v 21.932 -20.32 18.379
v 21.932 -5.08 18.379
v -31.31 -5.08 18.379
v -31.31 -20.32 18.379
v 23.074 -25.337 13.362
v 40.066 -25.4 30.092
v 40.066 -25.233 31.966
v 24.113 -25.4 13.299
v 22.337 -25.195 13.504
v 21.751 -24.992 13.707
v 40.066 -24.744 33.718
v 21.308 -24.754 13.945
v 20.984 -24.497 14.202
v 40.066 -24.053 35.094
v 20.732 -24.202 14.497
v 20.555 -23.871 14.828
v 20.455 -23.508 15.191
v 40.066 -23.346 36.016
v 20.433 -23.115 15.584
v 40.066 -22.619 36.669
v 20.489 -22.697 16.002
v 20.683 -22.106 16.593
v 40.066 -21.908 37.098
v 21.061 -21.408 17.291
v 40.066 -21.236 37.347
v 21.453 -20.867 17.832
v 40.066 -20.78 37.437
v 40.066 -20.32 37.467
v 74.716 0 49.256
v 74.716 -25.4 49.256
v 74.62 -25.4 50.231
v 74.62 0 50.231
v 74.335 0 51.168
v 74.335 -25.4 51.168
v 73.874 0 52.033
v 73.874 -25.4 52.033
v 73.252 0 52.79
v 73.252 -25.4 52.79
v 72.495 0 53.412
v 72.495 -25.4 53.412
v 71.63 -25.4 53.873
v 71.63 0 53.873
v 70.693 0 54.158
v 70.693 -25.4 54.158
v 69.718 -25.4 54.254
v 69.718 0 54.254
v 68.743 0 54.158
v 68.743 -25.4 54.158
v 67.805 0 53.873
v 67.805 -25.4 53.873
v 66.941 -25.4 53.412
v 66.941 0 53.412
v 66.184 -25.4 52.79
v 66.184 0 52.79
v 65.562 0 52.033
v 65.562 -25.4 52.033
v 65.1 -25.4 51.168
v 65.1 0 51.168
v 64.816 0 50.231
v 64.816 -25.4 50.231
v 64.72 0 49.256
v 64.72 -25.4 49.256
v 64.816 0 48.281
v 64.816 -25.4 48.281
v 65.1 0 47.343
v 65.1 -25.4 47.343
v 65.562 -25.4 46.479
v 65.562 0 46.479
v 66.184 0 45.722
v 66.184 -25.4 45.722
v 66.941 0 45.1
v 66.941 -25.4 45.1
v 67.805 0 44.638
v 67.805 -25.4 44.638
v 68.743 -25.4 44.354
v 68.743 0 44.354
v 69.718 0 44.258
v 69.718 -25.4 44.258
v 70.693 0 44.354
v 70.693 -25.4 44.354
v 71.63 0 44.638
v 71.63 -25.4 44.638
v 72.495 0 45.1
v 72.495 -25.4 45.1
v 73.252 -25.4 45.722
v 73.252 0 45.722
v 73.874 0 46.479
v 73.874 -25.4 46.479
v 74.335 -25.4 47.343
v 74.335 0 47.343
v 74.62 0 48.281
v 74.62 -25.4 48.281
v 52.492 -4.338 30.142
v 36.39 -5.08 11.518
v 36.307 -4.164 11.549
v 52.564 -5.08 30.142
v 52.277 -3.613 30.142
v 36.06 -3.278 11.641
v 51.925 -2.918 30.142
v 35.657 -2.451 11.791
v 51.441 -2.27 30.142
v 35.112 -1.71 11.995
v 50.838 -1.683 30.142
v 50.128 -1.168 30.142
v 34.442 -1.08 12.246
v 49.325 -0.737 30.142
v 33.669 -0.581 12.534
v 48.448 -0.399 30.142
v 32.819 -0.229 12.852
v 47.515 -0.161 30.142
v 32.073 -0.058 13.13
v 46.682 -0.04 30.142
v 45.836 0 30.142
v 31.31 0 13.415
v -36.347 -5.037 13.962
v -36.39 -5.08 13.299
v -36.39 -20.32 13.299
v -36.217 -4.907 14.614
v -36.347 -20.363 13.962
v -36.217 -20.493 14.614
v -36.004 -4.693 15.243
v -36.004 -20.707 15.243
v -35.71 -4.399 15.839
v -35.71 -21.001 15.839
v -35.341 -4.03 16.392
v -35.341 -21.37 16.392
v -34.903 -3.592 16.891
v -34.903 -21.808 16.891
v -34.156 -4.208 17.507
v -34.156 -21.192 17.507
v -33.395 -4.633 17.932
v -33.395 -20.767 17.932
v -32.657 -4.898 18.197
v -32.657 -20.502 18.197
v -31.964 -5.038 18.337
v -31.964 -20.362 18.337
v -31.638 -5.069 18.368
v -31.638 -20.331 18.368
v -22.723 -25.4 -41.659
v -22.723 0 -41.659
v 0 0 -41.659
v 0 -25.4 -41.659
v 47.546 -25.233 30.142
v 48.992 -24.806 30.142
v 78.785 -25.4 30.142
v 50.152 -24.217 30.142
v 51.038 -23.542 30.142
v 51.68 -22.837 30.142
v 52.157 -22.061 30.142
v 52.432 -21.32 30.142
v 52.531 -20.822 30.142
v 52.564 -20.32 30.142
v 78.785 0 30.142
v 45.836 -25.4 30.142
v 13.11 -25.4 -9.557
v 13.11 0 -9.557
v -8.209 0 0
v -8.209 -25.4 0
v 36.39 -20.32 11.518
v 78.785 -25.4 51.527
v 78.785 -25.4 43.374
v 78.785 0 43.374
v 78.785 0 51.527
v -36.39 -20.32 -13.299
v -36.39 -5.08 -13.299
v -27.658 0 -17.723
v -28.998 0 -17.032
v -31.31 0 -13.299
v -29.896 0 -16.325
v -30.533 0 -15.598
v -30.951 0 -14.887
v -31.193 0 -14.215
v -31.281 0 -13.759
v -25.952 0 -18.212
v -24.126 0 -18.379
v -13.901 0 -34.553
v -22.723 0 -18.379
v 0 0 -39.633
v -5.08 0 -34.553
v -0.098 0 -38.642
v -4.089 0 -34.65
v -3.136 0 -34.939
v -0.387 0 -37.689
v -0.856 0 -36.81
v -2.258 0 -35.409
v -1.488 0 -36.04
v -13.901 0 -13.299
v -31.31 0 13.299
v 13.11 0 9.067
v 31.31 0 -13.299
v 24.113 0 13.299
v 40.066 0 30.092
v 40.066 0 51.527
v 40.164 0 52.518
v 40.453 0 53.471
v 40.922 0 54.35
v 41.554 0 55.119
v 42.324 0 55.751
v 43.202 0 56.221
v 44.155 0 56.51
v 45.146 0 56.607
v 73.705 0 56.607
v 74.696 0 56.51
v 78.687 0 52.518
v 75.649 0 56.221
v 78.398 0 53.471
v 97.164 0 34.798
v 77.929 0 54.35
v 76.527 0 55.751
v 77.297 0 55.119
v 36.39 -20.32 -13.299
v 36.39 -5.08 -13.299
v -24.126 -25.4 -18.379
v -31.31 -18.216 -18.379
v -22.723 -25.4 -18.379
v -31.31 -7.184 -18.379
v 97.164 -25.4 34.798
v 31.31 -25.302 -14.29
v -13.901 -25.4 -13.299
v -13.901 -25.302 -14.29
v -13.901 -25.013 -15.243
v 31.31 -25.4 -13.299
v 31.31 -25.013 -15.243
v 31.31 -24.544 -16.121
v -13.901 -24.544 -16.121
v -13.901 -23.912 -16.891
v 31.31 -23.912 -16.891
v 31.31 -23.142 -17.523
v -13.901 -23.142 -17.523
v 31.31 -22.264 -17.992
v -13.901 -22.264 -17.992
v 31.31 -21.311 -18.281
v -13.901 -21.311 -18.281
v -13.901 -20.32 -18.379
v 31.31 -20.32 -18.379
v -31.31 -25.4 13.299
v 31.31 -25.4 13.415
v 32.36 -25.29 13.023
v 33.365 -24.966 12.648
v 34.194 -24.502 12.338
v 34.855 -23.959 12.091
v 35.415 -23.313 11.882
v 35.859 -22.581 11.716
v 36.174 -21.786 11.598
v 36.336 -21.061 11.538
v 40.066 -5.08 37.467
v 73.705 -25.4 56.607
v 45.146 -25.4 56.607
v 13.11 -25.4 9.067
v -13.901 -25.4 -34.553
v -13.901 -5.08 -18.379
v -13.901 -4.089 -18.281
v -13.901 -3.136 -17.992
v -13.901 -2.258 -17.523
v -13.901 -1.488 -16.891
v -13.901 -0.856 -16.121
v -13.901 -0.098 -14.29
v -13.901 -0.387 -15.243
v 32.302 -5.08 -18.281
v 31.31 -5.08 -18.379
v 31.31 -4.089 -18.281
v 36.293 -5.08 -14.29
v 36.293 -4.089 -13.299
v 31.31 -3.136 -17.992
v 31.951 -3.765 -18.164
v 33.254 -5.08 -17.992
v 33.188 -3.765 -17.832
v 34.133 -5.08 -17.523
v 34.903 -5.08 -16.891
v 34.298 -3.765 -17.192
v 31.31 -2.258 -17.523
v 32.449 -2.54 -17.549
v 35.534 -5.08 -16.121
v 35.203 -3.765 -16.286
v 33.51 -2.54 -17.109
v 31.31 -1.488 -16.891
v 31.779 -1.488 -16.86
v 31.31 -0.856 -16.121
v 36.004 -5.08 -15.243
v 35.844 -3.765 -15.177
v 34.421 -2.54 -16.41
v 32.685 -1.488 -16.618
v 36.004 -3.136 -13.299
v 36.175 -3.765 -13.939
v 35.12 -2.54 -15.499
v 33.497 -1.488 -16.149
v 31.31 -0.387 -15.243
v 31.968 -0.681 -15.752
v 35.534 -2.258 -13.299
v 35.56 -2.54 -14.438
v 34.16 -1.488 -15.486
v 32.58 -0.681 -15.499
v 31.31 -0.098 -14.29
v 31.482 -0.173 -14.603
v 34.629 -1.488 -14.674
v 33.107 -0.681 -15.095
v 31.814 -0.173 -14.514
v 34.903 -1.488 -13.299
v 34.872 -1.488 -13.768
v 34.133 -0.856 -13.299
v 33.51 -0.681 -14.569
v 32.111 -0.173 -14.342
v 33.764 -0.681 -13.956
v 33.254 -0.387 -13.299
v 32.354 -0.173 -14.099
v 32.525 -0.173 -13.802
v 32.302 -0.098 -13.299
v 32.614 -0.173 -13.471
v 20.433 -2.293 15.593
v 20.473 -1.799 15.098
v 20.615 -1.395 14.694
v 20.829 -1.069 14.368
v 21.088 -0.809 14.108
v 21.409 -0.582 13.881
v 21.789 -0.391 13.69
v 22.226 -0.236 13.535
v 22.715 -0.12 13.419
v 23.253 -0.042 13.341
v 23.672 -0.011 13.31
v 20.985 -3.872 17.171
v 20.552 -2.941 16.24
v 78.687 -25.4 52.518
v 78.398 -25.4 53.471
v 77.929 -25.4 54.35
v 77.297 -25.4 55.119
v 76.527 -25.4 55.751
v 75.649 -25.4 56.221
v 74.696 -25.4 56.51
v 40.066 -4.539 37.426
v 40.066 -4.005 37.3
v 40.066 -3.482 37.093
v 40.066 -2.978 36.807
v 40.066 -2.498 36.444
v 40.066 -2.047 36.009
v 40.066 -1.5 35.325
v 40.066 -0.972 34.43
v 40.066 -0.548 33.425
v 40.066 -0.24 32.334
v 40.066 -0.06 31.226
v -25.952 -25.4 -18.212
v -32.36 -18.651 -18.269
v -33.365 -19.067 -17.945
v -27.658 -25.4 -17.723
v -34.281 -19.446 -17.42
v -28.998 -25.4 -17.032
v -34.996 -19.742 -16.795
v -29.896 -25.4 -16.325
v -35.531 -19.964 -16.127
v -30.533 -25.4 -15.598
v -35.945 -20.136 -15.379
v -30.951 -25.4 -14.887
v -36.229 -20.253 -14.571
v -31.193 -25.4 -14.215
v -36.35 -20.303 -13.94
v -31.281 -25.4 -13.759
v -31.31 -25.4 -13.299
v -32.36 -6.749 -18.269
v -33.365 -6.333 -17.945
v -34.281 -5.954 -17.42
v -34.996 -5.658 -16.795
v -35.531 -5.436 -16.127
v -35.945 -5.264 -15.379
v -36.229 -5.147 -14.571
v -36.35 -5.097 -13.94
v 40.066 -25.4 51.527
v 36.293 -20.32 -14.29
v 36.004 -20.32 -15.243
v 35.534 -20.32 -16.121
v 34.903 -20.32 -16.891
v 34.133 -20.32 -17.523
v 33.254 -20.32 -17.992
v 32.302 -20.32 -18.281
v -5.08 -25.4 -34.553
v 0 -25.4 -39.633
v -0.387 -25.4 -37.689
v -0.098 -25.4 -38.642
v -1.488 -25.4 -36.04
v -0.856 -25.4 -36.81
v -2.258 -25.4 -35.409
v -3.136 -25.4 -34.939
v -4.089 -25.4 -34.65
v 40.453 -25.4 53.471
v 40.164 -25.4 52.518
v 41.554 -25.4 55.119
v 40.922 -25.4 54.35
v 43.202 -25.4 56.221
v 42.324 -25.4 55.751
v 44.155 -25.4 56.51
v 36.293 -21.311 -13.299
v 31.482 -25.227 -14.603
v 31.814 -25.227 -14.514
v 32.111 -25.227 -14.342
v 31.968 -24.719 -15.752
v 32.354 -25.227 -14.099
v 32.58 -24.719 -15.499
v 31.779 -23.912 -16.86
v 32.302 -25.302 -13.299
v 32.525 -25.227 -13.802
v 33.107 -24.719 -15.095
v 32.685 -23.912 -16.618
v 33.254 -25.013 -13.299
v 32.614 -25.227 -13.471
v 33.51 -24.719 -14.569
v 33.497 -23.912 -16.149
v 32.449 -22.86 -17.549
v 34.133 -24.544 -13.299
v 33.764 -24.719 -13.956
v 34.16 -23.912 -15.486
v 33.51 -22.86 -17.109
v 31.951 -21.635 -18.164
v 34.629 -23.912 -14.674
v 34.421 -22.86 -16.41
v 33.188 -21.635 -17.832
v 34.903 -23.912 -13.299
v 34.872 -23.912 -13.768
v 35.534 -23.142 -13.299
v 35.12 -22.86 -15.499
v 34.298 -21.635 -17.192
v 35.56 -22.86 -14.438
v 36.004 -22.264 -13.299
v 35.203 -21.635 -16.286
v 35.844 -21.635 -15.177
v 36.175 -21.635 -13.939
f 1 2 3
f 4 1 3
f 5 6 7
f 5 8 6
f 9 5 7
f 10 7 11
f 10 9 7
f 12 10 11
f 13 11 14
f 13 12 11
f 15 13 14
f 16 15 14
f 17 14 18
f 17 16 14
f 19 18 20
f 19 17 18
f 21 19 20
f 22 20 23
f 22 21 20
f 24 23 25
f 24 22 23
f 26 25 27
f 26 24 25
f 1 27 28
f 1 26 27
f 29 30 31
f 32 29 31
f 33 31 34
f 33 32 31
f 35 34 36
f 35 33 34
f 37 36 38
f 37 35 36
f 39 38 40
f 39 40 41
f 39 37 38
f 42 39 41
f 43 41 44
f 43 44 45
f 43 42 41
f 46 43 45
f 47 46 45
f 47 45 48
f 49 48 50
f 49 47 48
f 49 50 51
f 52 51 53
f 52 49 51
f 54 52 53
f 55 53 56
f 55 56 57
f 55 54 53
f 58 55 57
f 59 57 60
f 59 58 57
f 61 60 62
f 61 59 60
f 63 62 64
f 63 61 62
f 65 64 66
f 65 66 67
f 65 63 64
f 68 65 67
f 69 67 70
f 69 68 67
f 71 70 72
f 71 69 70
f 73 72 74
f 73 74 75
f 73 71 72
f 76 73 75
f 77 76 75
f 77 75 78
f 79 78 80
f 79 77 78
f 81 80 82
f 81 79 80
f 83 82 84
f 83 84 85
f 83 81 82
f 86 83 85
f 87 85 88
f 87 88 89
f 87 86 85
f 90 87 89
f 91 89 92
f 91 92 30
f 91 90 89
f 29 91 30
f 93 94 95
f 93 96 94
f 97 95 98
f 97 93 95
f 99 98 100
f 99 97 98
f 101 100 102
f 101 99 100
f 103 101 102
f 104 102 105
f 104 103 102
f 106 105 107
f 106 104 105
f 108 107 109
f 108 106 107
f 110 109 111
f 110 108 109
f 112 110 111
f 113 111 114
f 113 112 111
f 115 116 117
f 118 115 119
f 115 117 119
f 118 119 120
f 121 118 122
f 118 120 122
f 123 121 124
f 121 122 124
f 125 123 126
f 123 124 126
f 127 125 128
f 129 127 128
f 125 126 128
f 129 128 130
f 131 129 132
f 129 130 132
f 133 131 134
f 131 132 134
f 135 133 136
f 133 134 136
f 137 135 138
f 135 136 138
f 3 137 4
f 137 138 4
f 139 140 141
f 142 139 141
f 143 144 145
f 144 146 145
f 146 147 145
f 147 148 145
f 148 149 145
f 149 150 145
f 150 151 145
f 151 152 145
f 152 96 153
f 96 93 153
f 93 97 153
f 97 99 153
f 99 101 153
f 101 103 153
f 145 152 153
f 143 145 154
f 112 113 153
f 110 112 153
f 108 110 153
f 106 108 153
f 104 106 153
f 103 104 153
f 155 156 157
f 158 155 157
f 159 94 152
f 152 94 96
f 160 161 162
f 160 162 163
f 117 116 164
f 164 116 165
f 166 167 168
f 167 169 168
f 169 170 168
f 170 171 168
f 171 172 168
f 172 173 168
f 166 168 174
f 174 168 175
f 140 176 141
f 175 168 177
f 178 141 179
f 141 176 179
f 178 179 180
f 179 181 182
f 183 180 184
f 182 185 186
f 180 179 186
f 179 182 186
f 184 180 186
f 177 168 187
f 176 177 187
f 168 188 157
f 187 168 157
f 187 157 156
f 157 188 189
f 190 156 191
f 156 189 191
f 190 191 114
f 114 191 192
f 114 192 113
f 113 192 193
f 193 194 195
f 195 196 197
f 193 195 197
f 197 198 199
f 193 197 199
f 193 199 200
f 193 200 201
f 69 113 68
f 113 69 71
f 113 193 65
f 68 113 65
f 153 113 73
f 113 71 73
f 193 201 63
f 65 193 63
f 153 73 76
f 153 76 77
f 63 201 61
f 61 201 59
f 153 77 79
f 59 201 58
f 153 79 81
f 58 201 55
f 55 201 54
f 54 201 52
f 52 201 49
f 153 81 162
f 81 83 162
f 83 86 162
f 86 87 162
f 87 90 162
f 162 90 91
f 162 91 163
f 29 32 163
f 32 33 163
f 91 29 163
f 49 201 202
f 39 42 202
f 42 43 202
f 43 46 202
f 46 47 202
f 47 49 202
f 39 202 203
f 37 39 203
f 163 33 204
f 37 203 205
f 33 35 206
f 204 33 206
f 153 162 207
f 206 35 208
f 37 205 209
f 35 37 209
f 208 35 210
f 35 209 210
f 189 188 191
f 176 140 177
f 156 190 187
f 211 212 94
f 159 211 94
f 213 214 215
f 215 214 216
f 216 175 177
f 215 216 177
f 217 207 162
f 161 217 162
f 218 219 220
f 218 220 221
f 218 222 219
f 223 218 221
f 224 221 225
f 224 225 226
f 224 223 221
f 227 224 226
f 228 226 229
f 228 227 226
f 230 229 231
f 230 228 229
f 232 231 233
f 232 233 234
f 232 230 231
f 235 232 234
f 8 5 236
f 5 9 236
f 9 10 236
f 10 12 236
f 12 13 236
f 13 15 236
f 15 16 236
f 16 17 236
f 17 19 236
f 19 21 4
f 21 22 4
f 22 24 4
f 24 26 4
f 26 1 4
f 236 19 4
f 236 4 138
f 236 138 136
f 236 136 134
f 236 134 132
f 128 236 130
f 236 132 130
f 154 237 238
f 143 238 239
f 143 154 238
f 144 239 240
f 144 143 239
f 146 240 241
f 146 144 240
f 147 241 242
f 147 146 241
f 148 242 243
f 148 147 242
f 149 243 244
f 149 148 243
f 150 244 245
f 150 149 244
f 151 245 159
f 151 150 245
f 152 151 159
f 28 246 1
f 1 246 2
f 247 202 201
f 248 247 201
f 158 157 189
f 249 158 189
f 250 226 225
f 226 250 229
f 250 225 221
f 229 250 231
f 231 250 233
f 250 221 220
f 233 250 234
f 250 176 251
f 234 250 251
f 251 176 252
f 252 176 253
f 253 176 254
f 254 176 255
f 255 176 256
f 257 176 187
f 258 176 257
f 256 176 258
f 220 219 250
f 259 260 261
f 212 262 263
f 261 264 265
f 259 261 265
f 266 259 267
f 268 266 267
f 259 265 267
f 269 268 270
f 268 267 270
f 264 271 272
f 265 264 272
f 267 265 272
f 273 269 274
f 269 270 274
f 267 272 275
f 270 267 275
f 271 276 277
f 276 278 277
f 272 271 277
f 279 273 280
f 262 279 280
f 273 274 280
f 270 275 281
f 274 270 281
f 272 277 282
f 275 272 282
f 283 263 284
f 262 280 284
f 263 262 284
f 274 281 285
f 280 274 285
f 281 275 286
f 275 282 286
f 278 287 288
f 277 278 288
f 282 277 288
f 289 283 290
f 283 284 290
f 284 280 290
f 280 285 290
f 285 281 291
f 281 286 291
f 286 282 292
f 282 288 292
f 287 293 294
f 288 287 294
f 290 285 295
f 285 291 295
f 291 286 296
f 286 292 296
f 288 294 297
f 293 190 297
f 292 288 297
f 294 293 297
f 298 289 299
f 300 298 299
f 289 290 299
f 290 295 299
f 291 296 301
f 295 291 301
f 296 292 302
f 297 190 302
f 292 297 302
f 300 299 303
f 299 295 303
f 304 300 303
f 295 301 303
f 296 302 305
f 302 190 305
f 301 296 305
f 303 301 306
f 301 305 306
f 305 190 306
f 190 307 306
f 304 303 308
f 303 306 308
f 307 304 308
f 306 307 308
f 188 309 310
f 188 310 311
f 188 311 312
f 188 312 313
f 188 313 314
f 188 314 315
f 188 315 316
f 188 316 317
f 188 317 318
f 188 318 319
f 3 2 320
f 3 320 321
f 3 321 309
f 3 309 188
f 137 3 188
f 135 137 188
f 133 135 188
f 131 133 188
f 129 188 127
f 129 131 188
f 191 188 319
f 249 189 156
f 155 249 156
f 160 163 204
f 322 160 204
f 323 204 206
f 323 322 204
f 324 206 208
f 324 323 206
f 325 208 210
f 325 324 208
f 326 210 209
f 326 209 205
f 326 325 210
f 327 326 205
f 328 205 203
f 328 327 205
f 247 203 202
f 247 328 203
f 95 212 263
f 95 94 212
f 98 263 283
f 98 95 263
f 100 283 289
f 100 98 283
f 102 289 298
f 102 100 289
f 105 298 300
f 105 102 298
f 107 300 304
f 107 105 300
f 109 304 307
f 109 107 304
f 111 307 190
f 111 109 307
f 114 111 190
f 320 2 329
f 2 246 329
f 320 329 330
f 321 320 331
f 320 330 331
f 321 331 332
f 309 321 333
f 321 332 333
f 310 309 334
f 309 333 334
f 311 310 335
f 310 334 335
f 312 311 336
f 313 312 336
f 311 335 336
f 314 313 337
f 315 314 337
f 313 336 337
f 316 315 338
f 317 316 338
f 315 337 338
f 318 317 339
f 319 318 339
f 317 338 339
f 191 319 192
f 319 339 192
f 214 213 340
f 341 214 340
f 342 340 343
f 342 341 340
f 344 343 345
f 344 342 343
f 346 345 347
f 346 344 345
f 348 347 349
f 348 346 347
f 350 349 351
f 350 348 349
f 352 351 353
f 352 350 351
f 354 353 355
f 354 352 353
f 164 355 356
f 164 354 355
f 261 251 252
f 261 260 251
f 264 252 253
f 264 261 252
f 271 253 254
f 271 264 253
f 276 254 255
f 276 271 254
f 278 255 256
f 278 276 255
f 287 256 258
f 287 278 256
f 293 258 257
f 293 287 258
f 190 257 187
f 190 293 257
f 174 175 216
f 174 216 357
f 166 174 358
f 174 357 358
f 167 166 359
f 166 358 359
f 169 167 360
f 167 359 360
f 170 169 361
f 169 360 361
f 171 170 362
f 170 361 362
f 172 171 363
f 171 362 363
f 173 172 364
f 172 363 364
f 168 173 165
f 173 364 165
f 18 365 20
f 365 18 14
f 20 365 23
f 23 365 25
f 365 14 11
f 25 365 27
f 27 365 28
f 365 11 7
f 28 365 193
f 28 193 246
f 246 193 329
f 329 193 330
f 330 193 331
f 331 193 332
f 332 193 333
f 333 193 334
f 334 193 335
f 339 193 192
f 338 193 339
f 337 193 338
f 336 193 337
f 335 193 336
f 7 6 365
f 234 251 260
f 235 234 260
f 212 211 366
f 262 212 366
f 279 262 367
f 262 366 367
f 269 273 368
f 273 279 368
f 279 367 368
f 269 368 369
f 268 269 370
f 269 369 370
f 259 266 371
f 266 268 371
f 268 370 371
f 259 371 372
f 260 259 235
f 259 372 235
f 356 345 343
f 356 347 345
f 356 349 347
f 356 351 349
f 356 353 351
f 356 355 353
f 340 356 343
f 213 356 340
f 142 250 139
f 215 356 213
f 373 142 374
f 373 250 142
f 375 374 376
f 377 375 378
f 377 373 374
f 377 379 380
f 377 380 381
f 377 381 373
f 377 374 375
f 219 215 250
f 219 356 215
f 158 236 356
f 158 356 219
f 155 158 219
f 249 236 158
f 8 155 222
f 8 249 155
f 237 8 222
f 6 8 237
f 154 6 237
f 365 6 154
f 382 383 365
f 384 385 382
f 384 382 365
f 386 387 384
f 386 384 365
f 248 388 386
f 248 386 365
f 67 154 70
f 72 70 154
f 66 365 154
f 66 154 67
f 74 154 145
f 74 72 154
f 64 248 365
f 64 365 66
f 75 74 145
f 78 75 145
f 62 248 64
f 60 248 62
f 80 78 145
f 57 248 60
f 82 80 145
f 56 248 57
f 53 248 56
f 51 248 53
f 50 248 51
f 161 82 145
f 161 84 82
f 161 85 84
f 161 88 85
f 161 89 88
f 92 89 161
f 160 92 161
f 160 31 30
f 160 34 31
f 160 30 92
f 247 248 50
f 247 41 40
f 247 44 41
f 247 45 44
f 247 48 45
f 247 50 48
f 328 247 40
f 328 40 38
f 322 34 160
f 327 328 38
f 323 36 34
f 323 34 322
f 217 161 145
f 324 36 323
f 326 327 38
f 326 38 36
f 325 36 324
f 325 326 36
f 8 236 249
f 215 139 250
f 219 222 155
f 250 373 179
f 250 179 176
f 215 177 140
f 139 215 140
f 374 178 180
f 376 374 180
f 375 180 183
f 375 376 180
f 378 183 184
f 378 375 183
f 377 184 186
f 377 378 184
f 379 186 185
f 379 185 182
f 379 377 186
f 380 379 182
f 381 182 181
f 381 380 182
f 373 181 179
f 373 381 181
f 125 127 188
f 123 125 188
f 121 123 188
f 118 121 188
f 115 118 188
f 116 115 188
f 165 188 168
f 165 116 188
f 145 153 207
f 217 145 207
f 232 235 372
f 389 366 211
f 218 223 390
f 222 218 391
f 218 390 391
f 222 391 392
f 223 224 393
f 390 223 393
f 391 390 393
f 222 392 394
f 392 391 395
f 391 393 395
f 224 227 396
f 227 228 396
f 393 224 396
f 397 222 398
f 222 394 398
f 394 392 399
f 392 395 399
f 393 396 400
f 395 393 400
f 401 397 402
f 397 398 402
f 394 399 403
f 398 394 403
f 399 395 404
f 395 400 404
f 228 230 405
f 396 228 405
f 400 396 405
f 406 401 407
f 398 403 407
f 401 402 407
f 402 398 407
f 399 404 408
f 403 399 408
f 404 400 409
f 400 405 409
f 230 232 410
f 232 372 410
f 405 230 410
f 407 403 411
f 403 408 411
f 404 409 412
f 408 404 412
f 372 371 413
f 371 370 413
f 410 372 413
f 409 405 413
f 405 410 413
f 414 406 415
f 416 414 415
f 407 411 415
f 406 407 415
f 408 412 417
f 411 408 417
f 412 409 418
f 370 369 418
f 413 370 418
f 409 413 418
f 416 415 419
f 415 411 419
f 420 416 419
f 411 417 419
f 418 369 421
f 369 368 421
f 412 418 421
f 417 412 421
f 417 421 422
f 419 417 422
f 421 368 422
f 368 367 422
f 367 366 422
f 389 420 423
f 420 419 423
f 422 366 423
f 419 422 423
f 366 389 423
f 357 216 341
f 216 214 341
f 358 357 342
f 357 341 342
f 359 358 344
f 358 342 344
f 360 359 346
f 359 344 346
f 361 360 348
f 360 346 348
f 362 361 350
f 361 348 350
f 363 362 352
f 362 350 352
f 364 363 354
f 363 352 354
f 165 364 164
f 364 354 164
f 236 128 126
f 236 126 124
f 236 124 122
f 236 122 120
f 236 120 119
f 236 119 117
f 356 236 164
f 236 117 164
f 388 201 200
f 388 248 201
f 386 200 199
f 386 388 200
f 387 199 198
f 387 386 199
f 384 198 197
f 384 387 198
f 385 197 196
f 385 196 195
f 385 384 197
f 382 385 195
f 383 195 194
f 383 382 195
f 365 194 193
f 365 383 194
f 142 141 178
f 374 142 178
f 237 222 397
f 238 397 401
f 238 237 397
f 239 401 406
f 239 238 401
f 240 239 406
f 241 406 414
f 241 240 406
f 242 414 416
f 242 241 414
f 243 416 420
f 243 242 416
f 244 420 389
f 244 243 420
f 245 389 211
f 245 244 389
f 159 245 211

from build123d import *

# Parameters (mm, degrees)
F0_R     = 4.998133971
F1_DEPTH = 25.4
F2_R     = 5.08
F3_SIZE  = 5.08
F4_SIZE  = 5.08
F5_R     = 5.08
F6_R     = 5.08
F7_R     = 5.08
F8_R     = 5.08
F9_R     = 5.08


with BuildPart() as f1:
    # F0 (on Front) → F1 (new body)
    with BuildSketch(Plane.XZ):
        Polygon((-13.9009580016, -18.3790195733), (36.3904610276, -18.3790195733), (36.3904610276, 11.5175191313), (36.3904610276, 18.3790195733), (21.9322983176, 18.3790195733), (-36.3904610276, 18.3790195733), (-36.3904610276, -18.3790195733), (-22.7228868753, -18.3790195733), (-22.7228868753, -41.6591130197), (0, -41.6591130197), (0, -34.5525592566), (-13.9009580016, -34.5525592566), align=None)
        Polygon((-8.2092965022, 0), (13.1103685126, 9.0669831261), (13.1103685126, -9.5570906997), align=None, mode=Mode.SUBTRACT)
        Polygon((36.3904610276, 18.3790195733), (36.3904610276, 11.5175191313), (52.5639988482, 30.1415920258), (78.7847340107, 30.1415920258), (78.7847340107, 43.3744862676), (78.7847340107, 56.6073805094), (40.0662571192, 56.6073805094), (40.0662571192, 37.4673998365), (21.9322983176, 18.3790195733), align=None)
        with Locations((69.7177499533, 49.2557734251)):
            Circle(F0_R, mode=Mode.SUBTRACT)
        Polygon((78.7847340107, 43.3744862676), (78.7847340107, 30.1415920258), (97.1637517214, 34.7976125777), align=None)
    extrude(amount=F1_DEPTH)

    # F2
    f2_edges = [f1.edges().sort_by_distance(p)[0] for p in [
        (0, -12.7, -34.552559),
    ]]
    fillet(f2_edges, radius=F2_R)

    # F3
    f3_edges = [f1.edges().sort_by_distance(p)[0] for p in [
        (-7.229081, -25.4, 18.37902),
        (-36.390461, -25.4, 0),
    ]]
    chamfer(f3_edges, length=F3_SIZE)

    # F4
    f4_edges = [f1.edges().sort_by_distance(p)[0] for p in [
        (-7.229081, 0, 18.37902),
        (-36.390461, 0, 0),
    ]]
    chamfer(f4_edges, length=F4_SIZE)

    # F5
    f5_edges = [f1.edges().sort_by_distance(p)[0] for p in [
        (-36.390461, -12.7, 18.37902),
    ]]
    fillet(f5_edges, radius=F5_R)

    # F6
    f6_edges = [f1.edges().sort_by_distance(p)[0] for p in [
        (78.784734, -12.7, 56.607381),
        (40.066257, -12.7, 56.607381),
    ]]
    fillet(f6_edges, radius=F6_R)

    # F7
    f7_edges = [f1.edges().sort_by_distance(p)[0] for p in [
        (36.390461, -12.7, -18.37902),
    ]]
    fillet(f7_edges, radius=F7_R)

    # F8
    f8_edges = [f1.edges().sort_by_distance(p)[0] for p in [
        (-36.390461, -12.7, -18.37902),
        (-33.850461, -22.86, -18.37902),
        (-33.850461, -2.54, -18.37902),
    ]]
    fillet(f8_edges, radius=F8_R)

    # F9
    f9_edges = [f1.edges().sort_by_distance(p)[0] for p in [
        (30.999278, -25.4, 27.92321),
        (30.999278, 0, 27.92321),
        (44.47723, -25.4, 20.829556),
        (36.390461, -25.4, -0.89075),
        (44.47723, 0, 20.829556),
        (36.390461, 0, -0.89075),
    ]]
    fillet(f9_edges, radius=F9_R)


solid = f1.part
